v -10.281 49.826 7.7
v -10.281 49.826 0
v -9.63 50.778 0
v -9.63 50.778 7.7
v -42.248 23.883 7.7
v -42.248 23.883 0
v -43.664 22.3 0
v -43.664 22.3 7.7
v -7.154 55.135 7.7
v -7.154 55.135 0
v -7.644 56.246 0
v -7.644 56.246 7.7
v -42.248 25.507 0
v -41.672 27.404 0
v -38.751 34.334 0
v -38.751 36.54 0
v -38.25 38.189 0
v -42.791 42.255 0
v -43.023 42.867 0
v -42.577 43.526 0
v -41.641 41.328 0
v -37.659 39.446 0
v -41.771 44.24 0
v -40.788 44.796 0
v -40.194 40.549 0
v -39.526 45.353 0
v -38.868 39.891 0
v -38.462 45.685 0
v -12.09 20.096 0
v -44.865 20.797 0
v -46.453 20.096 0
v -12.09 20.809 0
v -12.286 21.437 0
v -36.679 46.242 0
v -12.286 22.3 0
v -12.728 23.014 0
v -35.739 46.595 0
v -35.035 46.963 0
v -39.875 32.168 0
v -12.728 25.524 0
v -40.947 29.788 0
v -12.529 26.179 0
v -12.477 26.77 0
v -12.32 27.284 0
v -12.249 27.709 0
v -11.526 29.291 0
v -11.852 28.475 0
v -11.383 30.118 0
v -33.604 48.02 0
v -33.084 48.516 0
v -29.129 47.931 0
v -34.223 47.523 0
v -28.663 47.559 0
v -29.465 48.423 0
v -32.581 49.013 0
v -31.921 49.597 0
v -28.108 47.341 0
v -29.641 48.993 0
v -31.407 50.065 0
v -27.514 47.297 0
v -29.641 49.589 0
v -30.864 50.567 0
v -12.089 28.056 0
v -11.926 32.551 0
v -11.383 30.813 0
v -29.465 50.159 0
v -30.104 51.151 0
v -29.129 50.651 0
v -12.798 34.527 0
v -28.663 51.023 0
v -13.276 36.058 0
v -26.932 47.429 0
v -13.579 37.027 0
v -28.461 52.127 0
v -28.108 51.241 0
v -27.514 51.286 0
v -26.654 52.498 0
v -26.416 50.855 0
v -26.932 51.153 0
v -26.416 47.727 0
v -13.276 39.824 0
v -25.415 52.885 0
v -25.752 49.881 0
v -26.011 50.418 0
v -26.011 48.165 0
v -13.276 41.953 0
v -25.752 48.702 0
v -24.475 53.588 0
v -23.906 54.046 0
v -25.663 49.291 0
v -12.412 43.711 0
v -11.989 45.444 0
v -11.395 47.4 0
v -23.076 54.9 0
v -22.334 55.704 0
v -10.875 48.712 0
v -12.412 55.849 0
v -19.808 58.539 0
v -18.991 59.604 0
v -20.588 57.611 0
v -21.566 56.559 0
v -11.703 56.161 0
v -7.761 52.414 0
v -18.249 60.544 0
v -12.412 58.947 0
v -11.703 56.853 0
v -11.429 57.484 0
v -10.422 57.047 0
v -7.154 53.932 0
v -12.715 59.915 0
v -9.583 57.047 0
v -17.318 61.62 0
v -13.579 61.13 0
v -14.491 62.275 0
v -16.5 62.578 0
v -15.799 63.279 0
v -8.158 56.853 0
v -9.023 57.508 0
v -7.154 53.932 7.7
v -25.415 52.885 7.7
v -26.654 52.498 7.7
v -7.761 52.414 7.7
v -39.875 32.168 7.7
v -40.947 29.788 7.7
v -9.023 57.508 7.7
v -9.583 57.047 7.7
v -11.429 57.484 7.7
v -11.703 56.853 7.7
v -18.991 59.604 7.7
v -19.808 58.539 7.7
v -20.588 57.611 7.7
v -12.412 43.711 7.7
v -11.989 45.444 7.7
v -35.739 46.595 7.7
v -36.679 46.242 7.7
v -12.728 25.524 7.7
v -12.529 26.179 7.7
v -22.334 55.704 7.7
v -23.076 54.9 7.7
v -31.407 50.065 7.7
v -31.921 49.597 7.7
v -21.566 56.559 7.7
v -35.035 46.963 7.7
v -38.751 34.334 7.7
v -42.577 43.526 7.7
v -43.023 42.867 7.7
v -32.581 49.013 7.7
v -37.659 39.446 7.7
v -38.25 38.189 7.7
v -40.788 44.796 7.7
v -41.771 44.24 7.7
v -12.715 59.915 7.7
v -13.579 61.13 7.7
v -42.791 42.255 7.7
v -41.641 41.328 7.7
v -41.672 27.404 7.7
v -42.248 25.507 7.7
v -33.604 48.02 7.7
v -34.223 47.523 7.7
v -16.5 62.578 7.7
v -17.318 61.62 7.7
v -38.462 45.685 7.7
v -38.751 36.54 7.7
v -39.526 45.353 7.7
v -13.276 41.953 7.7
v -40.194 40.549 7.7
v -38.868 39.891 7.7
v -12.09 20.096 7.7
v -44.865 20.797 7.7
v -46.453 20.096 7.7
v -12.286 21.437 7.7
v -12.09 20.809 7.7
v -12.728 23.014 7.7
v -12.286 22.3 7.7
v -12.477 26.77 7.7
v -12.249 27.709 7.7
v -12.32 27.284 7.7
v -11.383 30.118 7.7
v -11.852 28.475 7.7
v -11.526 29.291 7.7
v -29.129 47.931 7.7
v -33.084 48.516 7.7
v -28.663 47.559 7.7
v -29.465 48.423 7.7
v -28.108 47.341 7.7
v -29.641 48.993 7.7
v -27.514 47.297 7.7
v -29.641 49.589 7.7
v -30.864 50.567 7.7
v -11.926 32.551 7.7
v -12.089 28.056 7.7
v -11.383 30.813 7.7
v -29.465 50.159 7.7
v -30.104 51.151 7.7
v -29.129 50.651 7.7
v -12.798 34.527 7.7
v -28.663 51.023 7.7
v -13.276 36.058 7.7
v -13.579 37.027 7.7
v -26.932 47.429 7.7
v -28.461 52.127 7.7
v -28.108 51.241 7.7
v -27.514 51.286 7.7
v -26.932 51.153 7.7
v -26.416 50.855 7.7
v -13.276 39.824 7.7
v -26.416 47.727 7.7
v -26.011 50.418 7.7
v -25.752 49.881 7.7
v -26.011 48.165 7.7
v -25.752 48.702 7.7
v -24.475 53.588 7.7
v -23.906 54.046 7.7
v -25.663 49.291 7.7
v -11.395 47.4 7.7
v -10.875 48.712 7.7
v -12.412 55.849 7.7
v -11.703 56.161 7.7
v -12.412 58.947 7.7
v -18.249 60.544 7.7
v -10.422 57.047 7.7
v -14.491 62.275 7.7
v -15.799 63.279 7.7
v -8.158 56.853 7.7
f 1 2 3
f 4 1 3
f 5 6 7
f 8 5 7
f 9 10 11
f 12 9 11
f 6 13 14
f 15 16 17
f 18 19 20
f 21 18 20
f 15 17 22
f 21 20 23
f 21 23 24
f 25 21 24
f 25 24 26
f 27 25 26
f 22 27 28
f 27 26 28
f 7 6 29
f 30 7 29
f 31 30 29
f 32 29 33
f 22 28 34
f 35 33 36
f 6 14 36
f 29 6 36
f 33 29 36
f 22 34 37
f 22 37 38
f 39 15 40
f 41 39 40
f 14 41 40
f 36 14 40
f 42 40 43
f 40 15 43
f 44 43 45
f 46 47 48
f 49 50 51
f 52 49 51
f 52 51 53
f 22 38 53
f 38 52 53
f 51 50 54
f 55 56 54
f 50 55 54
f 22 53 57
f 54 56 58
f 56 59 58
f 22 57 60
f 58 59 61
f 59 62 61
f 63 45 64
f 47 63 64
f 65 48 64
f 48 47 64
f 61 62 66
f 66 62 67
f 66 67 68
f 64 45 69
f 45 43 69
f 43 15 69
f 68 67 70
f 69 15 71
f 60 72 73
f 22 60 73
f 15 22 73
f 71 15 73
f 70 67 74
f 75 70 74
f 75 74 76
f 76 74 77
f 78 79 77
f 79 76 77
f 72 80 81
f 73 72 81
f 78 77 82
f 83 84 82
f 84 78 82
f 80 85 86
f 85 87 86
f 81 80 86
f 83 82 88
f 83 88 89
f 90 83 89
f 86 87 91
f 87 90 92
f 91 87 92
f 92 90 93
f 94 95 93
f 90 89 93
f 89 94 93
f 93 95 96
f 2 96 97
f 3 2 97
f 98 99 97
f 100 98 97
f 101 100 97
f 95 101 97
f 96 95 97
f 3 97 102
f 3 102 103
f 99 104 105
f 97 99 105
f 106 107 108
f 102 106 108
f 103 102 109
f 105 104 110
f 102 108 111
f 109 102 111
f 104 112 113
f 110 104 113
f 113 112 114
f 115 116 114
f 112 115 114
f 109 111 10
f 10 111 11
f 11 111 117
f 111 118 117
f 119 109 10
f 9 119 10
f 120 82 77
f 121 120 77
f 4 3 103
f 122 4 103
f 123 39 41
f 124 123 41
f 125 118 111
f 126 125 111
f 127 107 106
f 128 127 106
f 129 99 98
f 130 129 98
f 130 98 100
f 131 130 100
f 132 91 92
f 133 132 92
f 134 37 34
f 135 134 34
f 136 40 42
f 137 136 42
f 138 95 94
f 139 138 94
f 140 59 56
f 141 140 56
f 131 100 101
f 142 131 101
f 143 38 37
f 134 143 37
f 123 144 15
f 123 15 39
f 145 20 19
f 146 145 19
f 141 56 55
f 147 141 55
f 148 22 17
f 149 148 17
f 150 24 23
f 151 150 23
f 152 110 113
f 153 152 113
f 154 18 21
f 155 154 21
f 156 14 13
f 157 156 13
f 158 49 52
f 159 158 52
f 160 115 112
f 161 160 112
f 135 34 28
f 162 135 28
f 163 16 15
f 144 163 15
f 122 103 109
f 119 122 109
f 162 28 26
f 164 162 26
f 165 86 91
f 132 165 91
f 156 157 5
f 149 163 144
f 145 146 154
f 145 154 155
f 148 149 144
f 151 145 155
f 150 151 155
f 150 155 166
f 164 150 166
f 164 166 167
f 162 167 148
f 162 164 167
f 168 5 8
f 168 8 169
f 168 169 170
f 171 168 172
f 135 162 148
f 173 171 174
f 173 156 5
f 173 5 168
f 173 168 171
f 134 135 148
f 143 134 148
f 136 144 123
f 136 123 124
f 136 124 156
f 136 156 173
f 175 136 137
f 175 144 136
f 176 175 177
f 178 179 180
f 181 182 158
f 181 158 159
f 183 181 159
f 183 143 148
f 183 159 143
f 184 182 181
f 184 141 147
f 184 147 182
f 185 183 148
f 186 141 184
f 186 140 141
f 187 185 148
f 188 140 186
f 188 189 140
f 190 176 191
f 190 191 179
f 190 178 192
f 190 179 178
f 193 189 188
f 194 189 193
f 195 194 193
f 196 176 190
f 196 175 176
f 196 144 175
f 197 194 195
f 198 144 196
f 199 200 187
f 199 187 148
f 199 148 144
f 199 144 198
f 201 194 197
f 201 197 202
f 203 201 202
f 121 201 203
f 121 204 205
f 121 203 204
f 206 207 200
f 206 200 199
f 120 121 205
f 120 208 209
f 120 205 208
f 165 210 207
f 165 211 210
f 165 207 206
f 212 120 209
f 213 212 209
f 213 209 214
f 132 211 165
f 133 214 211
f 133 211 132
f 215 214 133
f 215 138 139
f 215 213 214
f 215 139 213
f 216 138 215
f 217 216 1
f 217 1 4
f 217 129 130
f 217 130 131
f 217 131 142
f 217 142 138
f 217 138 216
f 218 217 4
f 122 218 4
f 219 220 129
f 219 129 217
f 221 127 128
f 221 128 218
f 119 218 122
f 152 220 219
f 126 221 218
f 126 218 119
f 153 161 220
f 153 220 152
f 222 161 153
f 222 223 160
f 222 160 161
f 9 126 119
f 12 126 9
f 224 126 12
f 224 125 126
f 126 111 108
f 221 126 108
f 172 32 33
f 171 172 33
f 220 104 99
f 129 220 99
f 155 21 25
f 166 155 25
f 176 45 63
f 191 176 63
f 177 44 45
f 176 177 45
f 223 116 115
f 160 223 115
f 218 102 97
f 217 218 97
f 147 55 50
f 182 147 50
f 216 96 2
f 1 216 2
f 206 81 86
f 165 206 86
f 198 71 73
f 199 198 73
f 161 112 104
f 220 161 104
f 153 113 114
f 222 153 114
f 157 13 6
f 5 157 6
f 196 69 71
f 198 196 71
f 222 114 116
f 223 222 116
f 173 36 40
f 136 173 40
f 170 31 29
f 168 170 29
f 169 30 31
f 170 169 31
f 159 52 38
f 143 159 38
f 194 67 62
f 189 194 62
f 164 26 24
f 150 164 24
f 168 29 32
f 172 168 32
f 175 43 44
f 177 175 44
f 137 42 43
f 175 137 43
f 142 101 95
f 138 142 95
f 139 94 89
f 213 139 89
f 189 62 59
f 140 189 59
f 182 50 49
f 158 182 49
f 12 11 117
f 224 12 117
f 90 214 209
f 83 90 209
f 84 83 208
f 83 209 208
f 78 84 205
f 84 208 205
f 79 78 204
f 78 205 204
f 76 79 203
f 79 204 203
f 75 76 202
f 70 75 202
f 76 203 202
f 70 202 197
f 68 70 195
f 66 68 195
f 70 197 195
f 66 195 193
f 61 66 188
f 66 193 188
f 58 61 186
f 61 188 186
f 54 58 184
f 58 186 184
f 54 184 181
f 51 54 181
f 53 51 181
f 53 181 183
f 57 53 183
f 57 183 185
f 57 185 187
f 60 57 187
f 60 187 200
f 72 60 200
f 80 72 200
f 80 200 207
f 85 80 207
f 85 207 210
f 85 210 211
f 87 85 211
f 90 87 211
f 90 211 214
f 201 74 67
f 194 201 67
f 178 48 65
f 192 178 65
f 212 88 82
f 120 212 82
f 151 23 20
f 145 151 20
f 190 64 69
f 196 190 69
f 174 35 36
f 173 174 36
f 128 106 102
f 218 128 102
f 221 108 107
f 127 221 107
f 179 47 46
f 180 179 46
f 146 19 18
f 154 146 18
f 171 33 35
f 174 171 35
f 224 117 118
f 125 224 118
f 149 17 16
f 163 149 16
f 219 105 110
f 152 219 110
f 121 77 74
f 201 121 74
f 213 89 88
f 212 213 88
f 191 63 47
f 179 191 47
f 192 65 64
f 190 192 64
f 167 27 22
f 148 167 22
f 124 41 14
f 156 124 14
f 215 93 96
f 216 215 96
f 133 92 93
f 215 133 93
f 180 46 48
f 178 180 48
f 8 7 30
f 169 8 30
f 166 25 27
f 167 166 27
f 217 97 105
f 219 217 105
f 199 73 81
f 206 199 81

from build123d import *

# Parameters (mm, degrees)
F1_DEPTH = 7.7
F2_R     = 2
F3_DEPTH = 14.4


with BuildPart() as f1:
    # F0 (on Top) → F1 (new body)
    with BuildSketch(Plane.XY):
        Polygon((-38.868088, 39.890725), (-37.658811, 39.446436), (-38.249725, 38.189034), (-38.750622, 36.540247), (-38.750622, 34.333538), (-39.874792, 32.168467), (-40.947256, 29.788468), (-41.671675, 27.403923), (-42.248044, 25.506711), (-42.248044, 23.882907), (-43.663666, 22.30031), (-44.865134, 20.796624), (-46.453279, 20.09597), (-12.089583, 20.09597), (-12.089583, 20.809148), (-12.285668, 21.436621), (-12.285668, 22.30031), (-12.727885, 23.013672), (-12.727885, 23.801431), (-12.727885, 24.664005), (-12.727885, 25.523571), (-12.528915, 26.178513), (-12.476629, 26.770333), (-12.320494, 27.284278), (-12.248813, 27.708853), (-12.088908, 28.056234), (-11.851807, 28.475296), (-11.526482, 29.291363), (-11.383266, 30.11846), (-11.383266, 30.81312), (-11.926459, 32.551334), (-12.7981, 34.52705), (-13.276388, 36.057569), (-13.579202, 37.026573), (-13.276388, 39.824102), (-13.276388, 41.953199), (-12.412329, 43.710936), (-11.989028, 45.443922), (-11.394863, 47.399715), (-10.874968, 48.711833), (-10.280802, 49.825892), (-9.63011, 50.777867), (-7.760718, 52.413587), (-7.153935, 53.932466), (-7.153935, 55.135302), (-7.64388, 56.245841), (-8.157964, 56.853395), (-9.022558, 57.507679), (-9.583375, 57.046662), (-10.421853, 57.046662), (-11.4294, 57.484314), (-11.703454, 56.853395), (-11.703454, 56.161334), (-12.412329, 55.848595), (-12.412329, 57.554416), (-12.412329, 58.947231), (-12.714608, 59.914522), (-13.579202, 61.12963), (-14.490531, 62.274631), (-15.799105, 63.278936), (-16.500128, 62.57841), (-17.317986, 61.620343), (-18.248623, 60.544401), (-18.991331, 59.603639), (-19.808309, 58.539093), (-20.58815, 57.610705), (-21.566048, 56.558538), (-22.333512, 55.704426), (-23.076219, 54.899827), (-23.905577, 54.045714), (-24.474986, 53.587709), (-25.415219, 52.8854), (-26.653593, 52.498408), (-28.460847, 52.127052), (-30.104453, 51.151142), (-30.863894, 50.566956), (-31.407185, 50.064556), (-31.921268, 49.597207), (-32.581396, 49.013022), (-33.083797, 48.516467), (-33.60372, 48.019908), (-34.222957, 47.52335), (-35.035051, 46.96336), (-35.73864, 46.594702), (-36.679402, 46.241917), (-38.461901, 45.684885), (-39.5265, 45.352735), (-40.787674, 44.796333), (-41.770652, 44.239931), (-42.577434, 43.525882), (-43.022554, 42.867474), (-42.790722, 42.255431), (-41.640826, 41.328095), (-40.19418, 40.549133), align=None)
    extrude(amount=F1_DEPTH)

    # F2 (on face) → F3 (cut)
    with BuildSketch(Plane.XY.offset(7.7)):
        with Locations((-27.663102, 49.291145)):
            Circle(F2_R)
    extrude(amount=-F3_DEPTH, mode=Mode.SUBTRACT)


solid = f1.part
